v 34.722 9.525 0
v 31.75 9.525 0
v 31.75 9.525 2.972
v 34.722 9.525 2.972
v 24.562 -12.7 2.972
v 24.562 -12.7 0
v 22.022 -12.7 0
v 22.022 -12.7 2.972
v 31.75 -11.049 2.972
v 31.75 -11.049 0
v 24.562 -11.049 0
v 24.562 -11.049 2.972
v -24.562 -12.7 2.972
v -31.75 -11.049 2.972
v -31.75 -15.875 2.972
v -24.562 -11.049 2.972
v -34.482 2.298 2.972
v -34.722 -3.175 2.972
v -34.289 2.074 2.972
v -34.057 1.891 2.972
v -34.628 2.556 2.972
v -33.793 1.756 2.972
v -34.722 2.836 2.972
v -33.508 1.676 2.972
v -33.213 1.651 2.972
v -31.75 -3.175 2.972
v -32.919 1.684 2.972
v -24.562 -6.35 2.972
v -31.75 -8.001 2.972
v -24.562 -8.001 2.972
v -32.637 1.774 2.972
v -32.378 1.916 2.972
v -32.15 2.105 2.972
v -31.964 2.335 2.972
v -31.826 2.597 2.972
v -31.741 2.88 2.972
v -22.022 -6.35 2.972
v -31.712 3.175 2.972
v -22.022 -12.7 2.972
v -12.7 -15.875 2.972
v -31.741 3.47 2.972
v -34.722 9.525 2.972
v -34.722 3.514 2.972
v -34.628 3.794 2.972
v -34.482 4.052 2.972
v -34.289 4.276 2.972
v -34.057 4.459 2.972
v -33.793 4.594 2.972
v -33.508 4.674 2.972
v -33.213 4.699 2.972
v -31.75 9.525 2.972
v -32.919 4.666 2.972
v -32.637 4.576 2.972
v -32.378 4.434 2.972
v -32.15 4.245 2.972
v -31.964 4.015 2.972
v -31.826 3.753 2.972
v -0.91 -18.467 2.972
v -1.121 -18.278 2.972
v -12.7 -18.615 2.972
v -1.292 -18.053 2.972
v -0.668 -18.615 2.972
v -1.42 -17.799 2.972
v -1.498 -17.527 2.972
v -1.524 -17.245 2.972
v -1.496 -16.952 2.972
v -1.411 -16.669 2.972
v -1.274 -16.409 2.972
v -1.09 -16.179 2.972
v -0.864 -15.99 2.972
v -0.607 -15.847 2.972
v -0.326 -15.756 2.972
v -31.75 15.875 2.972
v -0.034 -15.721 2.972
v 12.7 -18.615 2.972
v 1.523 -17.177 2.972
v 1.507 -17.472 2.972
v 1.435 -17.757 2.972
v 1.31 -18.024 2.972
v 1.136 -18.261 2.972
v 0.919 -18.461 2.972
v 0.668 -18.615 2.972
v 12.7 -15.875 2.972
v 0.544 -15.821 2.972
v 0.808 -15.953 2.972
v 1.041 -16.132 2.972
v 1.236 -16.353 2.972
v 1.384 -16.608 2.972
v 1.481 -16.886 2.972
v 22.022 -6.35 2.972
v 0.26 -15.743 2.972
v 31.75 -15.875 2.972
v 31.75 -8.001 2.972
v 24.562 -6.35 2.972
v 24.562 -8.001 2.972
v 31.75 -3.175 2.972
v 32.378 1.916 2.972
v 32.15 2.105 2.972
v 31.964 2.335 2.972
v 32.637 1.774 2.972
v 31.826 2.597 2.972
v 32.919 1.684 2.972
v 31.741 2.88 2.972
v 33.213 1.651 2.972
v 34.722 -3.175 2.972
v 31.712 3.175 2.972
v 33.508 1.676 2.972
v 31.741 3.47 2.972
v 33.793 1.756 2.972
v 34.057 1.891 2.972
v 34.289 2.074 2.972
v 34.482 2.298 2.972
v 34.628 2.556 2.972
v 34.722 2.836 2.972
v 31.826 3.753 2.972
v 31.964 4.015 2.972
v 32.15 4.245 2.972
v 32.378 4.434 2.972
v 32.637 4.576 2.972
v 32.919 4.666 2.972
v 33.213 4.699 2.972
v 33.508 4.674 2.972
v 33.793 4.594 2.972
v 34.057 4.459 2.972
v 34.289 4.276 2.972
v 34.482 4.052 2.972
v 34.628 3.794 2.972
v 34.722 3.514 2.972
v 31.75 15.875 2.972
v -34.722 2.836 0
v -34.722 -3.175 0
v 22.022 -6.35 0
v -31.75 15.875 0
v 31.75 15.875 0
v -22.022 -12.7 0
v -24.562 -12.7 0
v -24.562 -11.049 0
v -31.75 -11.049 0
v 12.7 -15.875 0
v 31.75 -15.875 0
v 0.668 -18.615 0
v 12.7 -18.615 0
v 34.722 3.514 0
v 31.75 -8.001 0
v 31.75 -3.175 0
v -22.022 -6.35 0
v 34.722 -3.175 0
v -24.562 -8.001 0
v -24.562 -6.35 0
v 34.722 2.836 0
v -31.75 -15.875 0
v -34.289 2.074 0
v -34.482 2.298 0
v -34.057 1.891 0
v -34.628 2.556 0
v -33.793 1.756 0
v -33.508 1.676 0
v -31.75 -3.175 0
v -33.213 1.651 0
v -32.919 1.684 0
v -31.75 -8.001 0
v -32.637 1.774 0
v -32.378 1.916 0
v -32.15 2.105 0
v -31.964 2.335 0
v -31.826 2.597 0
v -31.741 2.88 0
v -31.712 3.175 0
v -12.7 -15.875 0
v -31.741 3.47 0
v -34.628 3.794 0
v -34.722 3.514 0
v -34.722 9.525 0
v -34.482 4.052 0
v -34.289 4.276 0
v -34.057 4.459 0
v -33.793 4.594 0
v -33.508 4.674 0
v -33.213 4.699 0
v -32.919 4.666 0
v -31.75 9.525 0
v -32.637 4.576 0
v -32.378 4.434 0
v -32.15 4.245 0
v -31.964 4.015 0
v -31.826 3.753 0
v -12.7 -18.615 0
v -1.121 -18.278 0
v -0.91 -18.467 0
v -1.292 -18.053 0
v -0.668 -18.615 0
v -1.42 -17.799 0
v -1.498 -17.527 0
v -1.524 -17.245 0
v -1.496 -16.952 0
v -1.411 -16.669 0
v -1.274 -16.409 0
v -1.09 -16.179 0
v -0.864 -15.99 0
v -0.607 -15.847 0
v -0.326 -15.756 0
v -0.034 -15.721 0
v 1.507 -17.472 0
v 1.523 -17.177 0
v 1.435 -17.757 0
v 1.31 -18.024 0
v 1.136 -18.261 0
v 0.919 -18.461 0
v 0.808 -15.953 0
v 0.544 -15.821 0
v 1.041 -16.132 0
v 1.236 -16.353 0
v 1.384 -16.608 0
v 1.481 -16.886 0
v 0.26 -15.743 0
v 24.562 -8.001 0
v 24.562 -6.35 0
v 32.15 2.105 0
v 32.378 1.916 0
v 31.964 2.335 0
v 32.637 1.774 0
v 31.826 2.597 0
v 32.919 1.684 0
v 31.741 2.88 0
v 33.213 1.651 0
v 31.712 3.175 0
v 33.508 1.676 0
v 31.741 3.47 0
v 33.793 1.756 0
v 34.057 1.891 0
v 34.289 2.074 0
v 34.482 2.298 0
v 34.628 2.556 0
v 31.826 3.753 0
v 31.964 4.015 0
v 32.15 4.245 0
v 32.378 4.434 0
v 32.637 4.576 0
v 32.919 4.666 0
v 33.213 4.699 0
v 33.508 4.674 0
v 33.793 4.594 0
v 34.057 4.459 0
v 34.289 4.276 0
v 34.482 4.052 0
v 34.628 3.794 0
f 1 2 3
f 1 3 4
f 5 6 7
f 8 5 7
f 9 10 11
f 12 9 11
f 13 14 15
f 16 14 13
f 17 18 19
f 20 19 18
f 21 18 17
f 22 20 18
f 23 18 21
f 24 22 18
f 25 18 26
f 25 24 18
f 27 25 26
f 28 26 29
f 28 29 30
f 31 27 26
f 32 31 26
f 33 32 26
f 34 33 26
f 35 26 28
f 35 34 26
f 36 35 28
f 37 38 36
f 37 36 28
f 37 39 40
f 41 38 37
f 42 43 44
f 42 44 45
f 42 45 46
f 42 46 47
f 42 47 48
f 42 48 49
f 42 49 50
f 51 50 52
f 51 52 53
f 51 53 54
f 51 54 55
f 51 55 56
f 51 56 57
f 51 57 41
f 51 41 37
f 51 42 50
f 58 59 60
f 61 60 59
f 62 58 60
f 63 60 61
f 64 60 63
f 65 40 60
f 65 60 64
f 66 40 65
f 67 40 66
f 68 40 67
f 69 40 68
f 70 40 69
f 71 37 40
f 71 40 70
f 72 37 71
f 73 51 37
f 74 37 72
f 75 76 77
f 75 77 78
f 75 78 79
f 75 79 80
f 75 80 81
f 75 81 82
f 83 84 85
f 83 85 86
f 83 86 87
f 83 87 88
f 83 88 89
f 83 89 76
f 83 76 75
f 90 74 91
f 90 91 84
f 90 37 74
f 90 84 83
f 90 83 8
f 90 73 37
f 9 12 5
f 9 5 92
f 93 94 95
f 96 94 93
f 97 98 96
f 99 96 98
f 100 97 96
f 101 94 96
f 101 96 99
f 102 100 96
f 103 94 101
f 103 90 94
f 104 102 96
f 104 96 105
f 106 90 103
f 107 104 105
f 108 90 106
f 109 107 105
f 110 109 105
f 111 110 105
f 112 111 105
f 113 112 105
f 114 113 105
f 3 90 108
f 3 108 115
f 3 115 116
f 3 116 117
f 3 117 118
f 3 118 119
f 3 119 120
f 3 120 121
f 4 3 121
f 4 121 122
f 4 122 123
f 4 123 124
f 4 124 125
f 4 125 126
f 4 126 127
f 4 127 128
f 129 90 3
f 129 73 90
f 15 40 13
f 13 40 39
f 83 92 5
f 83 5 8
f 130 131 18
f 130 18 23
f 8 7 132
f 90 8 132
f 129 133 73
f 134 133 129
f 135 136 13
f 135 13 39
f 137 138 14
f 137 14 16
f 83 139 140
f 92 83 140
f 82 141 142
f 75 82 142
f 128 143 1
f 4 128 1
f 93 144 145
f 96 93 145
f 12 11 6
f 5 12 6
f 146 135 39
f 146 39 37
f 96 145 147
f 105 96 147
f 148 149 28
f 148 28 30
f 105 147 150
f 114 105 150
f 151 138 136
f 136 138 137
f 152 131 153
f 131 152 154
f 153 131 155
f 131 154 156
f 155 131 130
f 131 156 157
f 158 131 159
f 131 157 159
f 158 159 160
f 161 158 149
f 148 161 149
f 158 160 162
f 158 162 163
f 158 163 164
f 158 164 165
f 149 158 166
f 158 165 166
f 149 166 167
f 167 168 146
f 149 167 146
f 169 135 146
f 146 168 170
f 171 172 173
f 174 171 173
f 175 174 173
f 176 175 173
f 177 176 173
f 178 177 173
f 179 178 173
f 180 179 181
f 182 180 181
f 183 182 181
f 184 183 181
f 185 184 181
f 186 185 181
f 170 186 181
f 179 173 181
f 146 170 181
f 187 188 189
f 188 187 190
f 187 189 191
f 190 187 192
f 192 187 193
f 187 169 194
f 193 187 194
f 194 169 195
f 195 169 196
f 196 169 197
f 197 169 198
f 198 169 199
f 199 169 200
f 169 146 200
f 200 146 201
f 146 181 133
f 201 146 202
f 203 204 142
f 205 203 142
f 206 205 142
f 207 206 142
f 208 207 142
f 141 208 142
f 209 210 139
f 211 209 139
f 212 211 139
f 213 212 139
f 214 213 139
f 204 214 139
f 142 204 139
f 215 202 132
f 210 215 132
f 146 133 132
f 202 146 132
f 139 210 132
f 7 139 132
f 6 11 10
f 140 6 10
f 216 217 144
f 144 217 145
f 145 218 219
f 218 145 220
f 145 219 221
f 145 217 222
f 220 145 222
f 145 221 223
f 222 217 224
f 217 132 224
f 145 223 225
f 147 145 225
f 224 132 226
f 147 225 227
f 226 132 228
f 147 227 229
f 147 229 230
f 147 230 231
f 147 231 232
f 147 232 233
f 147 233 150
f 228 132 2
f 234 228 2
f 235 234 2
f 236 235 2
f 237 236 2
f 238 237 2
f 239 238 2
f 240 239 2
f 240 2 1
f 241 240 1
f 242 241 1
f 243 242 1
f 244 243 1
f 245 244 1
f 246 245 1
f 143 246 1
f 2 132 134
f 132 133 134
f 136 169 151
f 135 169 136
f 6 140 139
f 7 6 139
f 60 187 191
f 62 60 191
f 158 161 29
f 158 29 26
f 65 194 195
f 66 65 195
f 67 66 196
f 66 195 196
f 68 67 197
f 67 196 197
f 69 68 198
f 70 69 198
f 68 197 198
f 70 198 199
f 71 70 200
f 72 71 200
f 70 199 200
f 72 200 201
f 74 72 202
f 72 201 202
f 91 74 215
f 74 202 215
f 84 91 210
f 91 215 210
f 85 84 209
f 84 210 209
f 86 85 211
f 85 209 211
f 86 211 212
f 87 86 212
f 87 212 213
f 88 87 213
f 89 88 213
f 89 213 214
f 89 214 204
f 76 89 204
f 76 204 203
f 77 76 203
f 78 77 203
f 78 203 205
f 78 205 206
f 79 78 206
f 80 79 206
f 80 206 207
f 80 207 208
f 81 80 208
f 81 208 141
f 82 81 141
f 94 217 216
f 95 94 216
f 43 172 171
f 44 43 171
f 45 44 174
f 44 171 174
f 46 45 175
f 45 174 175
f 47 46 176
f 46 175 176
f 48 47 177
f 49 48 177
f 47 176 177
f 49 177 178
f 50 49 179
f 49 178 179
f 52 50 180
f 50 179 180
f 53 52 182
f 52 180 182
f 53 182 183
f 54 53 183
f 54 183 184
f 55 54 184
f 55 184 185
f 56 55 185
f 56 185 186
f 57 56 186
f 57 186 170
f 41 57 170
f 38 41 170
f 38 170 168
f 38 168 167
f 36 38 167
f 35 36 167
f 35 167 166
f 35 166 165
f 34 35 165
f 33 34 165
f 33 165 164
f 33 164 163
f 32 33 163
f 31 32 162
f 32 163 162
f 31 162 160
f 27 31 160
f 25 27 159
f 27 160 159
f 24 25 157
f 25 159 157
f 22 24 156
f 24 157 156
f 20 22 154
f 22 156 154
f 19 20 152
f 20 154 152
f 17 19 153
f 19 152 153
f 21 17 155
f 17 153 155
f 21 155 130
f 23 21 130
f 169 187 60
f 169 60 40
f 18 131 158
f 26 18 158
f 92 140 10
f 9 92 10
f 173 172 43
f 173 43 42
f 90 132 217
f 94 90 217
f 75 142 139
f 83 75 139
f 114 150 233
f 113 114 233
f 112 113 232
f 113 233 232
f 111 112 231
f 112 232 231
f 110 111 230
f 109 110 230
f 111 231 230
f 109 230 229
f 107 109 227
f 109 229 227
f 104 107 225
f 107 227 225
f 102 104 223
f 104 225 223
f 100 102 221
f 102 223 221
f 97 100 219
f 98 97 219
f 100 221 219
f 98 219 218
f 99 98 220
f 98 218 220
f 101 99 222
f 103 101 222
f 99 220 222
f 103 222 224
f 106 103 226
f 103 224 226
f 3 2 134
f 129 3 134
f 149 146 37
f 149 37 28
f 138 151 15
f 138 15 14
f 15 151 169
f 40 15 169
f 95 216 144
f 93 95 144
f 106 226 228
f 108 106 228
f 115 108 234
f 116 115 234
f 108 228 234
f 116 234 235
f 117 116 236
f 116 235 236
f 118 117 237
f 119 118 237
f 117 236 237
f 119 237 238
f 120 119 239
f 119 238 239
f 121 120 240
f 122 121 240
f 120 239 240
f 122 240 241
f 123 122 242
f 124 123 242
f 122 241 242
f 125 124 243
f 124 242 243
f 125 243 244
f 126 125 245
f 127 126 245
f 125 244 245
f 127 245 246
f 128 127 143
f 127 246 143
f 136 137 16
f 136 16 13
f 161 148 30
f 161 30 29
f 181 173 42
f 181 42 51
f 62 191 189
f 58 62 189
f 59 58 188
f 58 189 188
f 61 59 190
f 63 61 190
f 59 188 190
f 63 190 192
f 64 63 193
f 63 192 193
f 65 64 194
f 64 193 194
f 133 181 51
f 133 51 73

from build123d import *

# Parameters (mm, degrees)
SKETCH1_W           = 2.9718
SKETCH1_H           = 12.7
SKETCH1_W_2         = 63.5
SKETCH1_H_2         = 31.75
SKETCH1_W_3         = 25.4
SKETCH1_H_3         = 2.739734253
BOSS_EXTRUDE1_DEPTH = 2.9718
CUT_EXTRUDE1_DEPTH  = 3.9718


with BuildPart() as part:
    # Sketch1 → Boss-Extrude1 (new body)
    with BuildSketch(Plane.XY):
        with Locations((-33.2359, 3.175)):
            Rectangle(SKETCH1_W, SKETCH1_H)
        Rectangle(SKETCH1_W_2, SKETCH1_H_2)
        with Locations((33.2359, 3.175)):
            Rectangle(SKETCH1_W, SKETCH1_H)
        with Locations((0, -17.244867127)):
            Rectangle(SKETCH1_W_3, SKETCH1_H_3)
    extrude(amount=BOSS_EXTRUDE1_DEPTH)

    # Sketch2 → Cut-Extrude1 (cut, through all)
    with BuildSketch(Plane(origin=(0, 0, 0), x_dir=(-1, 0, 0), z_dir=(0, 0, -1))):
        with BuildLine():
            ThreePointArc((34.7218, 2.836359793), (34.750345047, 3.00461162), (34.7599, 3.175))
            ThreePointArc((34.7599, 3.175), (34.750345047, 3.34538838), (34.7218, 3.513640207))
            Line((34.7218, 3.513640207), (34.7218, 2.836359793))
        make_face()
        with BuildLine():
            Line((34.7218, 2.836359793), (34.7218, 3.513640207))
            ThreePointArc((34.7218, 3.513640207), (31.7119, 3.175), (34.7218, 2.836359793))
        make_face()
        with BuildLine():
            ThreePointArc((-34.7218, 2.836359793), (-33.06551162, 1.660554953), (-31.7119, 3.175))
            ThreePointArc((-31.7119, 3.175), (-33.06551162, 4.689445047), (-34.7218, 3.513640207))
            Line((-34.7218, 3.513640207), (-34.7218, 2.836359793))
        make_face()
        with BuildLine():
            Line((-34.7218, 2.836359793), (-34.7218, 3.513640207))
            ThreePointArc((-34.7218, 3.513640207), (-34.7599, 3.175), (-34.7218, 2.836359793))
        make_face()
        Polygon((-31.75, -8.001), (-31.75, -11.049), (-24.5618, -11.049), (-24.5618, -12.7), (-22.0218, -12.7), (-22.0218, -6.35), (-24.5618, -6.35), (-24.5618, -8.001), align=None)
        with BuildLine():
            ThreePointArc((0.667862303, -18.614734253), (1.29236182, -18.052565663), (1.524, -17.244867127))
            ThreePointArc((1.524, -17.244867127), (-0.807698536, -15.952505306), (-0.667862303, -18.614734253))
            Line((-0.667862303, -18.614734253), (0.667862303, -18.614734253))
        make_face()
        with BuildLine():
            Line((0.667862303, -18.614734253), (-0.667862303, -18.614734253))
            ThreePointArc((-0.667862303, -18.614734253), (0, -18.768867127), (0.667862303, -18.614734253))
        make_face()
        Polygon((31.75, -11.049), (24.5618, -11.049), (24.5618, -12.7), (22.0218, -12.7), (22.0218, -6.35), (24.5618, -6.35), (24.5618, -8.001), (31.75, -8.001), align=None)
    extrude(amount=-CUT_EXTRUDE1_DEPTH, mode=Mode.SUBTRACT)


solid = part.part
